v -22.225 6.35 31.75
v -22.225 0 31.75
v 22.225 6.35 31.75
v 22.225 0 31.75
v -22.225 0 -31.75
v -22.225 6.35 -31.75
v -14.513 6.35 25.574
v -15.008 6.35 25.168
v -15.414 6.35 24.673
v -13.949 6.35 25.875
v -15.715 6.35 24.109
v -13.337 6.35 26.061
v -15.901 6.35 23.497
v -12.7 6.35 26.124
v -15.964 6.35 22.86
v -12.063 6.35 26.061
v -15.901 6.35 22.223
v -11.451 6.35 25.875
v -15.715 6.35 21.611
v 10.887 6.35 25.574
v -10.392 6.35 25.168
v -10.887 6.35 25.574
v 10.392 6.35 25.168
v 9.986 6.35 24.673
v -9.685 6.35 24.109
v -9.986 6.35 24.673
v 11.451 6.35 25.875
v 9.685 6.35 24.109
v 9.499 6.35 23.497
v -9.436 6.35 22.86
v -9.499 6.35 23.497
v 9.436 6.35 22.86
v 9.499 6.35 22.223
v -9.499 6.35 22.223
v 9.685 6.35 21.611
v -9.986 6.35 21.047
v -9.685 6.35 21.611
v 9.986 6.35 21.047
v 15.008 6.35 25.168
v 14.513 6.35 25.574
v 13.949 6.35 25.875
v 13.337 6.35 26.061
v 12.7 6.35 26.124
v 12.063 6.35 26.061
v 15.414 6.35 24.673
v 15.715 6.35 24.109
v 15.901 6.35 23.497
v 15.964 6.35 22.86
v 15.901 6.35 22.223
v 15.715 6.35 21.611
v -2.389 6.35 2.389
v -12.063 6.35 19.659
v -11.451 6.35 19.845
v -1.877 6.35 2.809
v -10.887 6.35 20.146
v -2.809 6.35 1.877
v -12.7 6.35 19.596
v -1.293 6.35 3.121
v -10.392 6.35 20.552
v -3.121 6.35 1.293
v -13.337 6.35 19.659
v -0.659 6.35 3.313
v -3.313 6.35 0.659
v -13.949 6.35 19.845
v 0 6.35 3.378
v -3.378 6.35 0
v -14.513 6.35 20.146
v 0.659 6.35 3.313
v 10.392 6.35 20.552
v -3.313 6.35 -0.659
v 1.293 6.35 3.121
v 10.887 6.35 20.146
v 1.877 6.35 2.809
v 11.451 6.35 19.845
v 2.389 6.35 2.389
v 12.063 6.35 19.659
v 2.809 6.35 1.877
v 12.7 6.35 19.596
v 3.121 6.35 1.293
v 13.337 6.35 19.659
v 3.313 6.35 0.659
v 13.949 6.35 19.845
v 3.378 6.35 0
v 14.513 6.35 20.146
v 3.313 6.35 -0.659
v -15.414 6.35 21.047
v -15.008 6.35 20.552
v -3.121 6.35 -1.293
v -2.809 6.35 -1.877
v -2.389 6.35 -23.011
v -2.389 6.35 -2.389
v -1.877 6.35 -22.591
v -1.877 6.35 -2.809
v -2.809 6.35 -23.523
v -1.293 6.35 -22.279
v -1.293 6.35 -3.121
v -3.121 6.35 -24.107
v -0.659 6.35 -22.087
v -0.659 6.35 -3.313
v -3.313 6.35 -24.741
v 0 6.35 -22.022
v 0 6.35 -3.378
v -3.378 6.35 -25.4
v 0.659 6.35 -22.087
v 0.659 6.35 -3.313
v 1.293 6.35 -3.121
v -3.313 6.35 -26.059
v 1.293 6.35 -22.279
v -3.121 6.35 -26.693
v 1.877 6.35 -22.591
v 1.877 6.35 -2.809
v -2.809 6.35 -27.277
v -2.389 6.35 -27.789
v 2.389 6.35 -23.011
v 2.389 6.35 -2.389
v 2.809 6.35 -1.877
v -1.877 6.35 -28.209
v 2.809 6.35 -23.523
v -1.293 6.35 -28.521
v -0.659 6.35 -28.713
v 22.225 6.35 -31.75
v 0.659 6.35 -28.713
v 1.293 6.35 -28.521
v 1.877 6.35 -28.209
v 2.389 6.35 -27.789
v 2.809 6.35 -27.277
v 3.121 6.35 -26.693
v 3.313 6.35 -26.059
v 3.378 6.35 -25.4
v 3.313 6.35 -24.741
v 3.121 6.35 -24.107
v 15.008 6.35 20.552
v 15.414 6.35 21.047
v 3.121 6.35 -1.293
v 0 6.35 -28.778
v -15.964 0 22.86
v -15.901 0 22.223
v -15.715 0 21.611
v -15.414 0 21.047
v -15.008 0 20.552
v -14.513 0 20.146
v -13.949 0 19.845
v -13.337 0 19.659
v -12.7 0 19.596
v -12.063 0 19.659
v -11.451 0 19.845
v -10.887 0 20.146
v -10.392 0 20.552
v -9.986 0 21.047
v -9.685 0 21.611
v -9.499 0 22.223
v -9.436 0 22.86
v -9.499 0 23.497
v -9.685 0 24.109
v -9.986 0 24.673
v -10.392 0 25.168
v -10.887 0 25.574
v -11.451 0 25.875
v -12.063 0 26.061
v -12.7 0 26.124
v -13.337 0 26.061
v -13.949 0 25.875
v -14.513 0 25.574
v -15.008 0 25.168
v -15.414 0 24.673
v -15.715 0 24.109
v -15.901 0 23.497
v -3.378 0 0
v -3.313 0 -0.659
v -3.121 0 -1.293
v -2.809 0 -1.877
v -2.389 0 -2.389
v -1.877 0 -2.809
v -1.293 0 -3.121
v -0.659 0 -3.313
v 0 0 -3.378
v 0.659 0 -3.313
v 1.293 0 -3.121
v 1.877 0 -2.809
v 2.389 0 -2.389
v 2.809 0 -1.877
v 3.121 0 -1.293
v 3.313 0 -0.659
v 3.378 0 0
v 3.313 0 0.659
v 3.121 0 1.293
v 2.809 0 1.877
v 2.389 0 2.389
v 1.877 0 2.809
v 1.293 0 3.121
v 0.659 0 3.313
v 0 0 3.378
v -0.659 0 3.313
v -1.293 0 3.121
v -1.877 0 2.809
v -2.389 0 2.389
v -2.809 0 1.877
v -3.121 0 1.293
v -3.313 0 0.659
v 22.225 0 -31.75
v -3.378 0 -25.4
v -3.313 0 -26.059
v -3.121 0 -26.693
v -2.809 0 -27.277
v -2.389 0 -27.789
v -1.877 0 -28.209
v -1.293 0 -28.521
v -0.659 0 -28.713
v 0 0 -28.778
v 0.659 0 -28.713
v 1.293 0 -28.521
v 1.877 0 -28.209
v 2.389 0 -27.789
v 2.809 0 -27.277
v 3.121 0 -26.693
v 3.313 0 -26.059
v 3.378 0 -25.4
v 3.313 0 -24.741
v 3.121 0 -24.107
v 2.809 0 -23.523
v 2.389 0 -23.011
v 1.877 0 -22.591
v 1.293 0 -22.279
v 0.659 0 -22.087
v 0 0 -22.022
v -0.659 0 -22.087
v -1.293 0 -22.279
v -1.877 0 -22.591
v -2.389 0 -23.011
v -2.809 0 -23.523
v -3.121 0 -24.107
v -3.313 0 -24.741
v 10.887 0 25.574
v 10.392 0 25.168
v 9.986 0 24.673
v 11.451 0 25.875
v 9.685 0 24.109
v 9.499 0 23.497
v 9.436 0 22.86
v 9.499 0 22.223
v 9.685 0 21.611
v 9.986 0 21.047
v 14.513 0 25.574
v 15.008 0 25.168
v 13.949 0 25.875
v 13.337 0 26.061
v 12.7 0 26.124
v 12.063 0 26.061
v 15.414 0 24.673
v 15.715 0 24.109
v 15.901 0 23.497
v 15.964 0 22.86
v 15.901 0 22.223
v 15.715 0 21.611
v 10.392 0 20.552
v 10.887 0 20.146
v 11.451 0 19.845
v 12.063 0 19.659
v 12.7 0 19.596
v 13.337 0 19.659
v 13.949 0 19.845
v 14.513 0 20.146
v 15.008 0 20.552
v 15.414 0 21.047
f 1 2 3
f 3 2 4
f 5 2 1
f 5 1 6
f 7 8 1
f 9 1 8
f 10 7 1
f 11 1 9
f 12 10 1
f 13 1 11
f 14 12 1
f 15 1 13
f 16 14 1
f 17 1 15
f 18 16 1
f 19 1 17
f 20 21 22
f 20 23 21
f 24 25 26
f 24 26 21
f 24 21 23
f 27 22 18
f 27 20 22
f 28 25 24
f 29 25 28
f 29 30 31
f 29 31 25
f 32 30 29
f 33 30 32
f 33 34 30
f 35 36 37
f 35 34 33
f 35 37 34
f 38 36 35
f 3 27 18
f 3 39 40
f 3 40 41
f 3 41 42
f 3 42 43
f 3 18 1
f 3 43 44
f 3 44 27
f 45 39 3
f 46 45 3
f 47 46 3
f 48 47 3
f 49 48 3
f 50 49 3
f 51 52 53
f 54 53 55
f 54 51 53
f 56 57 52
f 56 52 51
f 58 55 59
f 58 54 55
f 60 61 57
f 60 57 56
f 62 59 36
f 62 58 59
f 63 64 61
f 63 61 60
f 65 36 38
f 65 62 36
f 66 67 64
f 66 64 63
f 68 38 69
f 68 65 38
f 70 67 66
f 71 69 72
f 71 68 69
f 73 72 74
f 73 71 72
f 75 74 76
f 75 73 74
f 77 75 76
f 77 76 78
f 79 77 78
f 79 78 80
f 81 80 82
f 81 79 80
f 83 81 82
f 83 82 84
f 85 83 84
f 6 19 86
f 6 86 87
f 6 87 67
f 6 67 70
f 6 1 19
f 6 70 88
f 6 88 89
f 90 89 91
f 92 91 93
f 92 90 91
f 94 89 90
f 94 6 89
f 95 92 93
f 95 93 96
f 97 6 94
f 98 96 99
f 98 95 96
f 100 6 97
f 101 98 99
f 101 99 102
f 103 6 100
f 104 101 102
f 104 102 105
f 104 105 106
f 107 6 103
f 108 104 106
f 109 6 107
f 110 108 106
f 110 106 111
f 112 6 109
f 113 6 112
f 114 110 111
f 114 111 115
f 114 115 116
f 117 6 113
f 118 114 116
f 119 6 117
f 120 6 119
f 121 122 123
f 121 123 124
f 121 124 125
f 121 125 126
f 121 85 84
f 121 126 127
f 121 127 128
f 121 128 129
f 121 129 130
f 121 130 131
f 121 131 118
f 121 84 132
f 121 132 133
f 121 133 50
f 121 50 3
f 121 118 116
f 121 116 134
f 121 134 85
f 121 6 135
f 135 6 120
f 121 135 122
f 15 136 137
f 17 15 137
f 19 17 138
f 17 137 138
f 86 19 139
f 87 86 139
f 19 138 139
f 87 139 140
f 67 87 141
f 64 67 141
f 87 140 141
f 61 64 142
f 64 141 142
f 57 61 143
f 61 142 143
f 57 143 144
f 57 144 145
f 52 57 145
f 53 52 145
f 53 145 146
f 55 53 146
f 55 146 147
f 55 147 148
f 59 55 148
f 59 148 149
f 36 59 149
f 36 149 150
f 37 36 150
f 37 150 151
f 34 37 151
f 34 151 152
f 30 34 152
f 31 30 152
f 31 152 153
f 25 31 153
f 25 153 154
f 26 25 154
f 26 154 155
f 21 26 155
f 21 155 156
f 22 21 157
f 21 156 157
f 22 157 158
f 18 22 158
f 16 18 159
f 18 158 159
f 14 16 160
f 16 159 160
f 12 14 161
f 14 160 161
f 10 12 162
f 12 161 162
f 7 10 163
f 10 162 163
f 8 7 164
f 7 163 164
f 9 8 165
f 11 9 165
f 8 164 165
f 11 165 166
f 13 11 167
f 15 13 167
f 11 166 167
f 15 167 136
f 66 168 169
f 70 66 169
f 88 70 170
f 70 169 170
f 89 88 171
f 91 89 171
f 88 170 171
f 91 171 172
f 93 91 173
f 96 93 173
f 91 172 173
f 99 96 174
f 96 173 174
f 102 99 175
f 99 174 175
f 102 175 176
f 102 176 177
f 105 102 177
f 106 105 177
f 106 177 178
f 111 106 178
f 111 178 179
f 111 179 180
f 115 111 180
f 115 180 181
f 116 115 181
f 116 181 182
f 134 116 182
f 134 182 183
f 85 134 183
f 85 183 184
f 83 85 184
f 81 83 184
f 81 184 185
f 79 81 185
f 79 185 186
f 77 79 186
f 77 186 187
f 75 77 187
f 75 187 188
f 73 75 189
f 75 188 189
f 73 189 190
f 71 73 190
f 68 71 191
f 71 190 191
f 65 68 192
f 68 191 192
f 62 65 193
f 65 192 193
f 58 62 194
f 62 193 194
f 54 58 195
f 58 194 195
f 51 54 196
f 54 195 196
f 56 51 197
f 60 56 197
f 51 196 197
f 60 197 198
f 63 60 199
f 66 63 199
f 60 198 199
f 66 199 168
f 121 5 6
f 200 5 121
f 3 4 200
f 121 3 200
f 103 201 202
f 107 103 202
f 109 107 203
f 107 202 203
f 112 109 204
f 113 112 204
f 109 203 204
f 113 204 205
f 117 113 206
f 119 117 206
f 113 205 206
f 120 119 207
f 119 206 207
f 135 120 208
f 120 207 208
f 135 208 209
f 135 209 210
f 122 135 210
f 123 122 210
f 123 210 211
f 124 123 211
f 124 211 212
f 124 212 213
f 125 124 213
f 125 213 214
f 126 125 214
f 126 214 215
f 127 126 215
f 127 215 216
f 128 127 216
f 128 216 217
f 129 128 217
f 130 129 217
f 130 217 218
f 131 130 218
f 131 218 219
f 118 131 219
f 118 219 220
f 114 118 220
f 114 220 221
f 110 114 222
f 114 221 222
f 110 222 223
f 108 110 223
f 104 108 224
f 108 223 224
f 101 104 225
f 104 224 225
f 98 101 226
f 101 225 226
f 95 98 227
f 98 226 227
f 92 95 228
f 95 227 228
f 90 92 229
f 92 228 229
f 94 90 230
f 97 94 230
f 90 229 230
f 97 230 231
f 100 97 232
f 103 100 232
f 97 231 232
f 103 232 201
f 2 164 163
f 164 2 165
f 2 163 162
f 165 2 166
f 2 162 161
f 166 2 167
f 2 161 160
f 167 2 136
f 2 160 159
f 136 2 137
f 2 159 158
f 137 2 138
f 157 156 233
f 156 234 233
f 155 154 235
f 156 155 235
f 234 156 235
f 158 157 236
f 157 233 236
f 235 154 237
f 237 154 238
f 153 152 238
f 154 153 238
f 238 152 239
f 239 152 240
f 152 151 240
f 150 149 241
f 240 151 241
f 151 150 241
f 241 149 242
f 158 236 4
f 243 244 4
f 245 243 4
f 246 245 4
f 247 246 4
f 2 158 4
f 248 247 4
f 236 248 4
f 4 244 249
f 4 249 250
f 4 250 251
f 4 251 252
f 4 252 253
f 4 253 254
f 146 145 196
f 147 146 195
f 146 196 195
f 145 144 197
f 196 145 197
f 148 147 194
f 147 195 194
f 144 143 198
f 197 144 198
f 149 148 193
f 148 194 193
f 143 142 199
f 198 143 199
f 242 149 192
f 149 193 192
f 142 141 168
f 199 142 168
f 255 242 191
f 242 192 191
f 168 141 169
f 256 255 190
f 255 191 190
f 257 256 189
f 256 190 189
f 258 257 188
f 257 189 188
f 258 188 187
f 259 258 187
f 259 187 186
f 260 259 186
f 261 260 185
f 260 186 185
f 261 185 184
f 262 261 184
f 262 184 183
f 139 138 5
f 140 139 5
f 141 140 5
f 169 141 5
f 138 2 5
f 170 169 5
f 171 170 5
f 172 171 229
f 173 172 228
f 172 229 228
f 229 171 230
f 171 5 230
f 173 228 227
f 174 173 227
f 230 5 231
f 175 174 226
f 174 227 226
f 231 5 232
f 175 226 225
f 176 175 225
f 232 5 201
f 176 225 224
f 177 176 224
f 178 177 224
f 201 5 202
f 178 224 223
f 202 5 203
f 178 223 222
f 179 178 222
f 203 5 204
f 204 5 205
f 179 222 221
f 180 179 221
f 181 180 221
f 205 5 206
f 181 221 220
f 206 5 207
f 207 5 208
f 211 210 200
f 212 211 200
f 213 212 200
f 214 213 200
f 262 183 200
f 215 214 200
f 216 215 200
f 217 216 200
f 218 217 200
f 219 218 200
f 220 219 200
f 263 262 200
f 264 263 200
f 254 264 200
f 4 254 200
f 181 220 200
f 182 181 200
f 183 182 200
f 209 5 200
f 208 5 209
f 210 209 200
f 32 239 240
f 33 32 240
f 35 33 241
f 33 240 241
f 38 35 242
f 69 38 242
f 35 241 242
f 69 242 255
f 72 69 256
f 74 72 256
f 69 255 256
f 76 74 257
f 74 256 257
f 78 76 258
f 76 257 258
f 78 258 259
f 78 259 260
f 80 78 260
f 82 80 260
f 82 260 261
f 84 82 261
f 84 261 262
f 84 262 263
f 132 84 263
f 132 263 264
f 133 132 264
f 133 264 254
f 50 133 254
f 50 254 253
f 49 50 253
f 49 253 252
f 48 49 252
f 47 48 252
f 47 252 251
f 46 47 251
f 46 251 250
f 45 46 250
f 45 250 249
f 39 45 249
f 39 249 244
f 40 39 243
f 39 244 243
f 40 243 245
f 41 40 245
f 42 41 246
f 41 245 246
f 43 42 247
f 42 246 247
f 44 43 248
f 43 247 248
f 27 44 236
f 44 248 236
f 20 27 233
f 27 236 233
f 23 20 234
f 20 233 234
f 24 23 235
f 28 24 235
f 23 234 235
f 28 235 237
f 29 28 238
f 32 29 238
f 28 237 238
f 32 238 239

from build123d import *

# Parameters (mm, degrees)
SKETCH1_W               = 44.45
SKETCH1_H               = 63.5
BOSS_EXTRUDE1_DEPTH     = 6.35
F_1_4_CLEARANCE_HOLE1_D = 6.7564
F_1_4_CLEARANCE_HOLE3_D = 6.5278


with BuildPart() as part:
    # Sketch1 → Boss-Extrude1 (new body)
    with BuildSketch(Plane(origin=(0, 0, 0), x_dir=(1, 0, 0), z_dir=(0, 1, 0))):
        Rectangle(SKETCH1_W, SKETCH1_H)
    extrude(amount=BOSS_EXTRUDE1_DEPTH)

    # 1/4 Clearance Hole1 (through all)
    with Locations(Plane(origin=(0, 6.35, 0), x_dir=(1, 0, 0), z_dir=(0, 1, 0))):
        with Locations((0, 25.4), (0, 0)):
            Hole(F_1_4_CLEARANCE_HOLE1_D / 2)

    # 1/4 Clearance Hole3 (through all)
    with Locations(Plane(origin=(0, 6.35, 0), x_dir=(1, 0, 0), z_dir=(0, 1, 0))):
        with Locations((-12.7, -22.86), (12.7, -22.86)):
            Hole(F_1_4_CLEARANCE_HOLE3_D / 2)


solid = part.part
